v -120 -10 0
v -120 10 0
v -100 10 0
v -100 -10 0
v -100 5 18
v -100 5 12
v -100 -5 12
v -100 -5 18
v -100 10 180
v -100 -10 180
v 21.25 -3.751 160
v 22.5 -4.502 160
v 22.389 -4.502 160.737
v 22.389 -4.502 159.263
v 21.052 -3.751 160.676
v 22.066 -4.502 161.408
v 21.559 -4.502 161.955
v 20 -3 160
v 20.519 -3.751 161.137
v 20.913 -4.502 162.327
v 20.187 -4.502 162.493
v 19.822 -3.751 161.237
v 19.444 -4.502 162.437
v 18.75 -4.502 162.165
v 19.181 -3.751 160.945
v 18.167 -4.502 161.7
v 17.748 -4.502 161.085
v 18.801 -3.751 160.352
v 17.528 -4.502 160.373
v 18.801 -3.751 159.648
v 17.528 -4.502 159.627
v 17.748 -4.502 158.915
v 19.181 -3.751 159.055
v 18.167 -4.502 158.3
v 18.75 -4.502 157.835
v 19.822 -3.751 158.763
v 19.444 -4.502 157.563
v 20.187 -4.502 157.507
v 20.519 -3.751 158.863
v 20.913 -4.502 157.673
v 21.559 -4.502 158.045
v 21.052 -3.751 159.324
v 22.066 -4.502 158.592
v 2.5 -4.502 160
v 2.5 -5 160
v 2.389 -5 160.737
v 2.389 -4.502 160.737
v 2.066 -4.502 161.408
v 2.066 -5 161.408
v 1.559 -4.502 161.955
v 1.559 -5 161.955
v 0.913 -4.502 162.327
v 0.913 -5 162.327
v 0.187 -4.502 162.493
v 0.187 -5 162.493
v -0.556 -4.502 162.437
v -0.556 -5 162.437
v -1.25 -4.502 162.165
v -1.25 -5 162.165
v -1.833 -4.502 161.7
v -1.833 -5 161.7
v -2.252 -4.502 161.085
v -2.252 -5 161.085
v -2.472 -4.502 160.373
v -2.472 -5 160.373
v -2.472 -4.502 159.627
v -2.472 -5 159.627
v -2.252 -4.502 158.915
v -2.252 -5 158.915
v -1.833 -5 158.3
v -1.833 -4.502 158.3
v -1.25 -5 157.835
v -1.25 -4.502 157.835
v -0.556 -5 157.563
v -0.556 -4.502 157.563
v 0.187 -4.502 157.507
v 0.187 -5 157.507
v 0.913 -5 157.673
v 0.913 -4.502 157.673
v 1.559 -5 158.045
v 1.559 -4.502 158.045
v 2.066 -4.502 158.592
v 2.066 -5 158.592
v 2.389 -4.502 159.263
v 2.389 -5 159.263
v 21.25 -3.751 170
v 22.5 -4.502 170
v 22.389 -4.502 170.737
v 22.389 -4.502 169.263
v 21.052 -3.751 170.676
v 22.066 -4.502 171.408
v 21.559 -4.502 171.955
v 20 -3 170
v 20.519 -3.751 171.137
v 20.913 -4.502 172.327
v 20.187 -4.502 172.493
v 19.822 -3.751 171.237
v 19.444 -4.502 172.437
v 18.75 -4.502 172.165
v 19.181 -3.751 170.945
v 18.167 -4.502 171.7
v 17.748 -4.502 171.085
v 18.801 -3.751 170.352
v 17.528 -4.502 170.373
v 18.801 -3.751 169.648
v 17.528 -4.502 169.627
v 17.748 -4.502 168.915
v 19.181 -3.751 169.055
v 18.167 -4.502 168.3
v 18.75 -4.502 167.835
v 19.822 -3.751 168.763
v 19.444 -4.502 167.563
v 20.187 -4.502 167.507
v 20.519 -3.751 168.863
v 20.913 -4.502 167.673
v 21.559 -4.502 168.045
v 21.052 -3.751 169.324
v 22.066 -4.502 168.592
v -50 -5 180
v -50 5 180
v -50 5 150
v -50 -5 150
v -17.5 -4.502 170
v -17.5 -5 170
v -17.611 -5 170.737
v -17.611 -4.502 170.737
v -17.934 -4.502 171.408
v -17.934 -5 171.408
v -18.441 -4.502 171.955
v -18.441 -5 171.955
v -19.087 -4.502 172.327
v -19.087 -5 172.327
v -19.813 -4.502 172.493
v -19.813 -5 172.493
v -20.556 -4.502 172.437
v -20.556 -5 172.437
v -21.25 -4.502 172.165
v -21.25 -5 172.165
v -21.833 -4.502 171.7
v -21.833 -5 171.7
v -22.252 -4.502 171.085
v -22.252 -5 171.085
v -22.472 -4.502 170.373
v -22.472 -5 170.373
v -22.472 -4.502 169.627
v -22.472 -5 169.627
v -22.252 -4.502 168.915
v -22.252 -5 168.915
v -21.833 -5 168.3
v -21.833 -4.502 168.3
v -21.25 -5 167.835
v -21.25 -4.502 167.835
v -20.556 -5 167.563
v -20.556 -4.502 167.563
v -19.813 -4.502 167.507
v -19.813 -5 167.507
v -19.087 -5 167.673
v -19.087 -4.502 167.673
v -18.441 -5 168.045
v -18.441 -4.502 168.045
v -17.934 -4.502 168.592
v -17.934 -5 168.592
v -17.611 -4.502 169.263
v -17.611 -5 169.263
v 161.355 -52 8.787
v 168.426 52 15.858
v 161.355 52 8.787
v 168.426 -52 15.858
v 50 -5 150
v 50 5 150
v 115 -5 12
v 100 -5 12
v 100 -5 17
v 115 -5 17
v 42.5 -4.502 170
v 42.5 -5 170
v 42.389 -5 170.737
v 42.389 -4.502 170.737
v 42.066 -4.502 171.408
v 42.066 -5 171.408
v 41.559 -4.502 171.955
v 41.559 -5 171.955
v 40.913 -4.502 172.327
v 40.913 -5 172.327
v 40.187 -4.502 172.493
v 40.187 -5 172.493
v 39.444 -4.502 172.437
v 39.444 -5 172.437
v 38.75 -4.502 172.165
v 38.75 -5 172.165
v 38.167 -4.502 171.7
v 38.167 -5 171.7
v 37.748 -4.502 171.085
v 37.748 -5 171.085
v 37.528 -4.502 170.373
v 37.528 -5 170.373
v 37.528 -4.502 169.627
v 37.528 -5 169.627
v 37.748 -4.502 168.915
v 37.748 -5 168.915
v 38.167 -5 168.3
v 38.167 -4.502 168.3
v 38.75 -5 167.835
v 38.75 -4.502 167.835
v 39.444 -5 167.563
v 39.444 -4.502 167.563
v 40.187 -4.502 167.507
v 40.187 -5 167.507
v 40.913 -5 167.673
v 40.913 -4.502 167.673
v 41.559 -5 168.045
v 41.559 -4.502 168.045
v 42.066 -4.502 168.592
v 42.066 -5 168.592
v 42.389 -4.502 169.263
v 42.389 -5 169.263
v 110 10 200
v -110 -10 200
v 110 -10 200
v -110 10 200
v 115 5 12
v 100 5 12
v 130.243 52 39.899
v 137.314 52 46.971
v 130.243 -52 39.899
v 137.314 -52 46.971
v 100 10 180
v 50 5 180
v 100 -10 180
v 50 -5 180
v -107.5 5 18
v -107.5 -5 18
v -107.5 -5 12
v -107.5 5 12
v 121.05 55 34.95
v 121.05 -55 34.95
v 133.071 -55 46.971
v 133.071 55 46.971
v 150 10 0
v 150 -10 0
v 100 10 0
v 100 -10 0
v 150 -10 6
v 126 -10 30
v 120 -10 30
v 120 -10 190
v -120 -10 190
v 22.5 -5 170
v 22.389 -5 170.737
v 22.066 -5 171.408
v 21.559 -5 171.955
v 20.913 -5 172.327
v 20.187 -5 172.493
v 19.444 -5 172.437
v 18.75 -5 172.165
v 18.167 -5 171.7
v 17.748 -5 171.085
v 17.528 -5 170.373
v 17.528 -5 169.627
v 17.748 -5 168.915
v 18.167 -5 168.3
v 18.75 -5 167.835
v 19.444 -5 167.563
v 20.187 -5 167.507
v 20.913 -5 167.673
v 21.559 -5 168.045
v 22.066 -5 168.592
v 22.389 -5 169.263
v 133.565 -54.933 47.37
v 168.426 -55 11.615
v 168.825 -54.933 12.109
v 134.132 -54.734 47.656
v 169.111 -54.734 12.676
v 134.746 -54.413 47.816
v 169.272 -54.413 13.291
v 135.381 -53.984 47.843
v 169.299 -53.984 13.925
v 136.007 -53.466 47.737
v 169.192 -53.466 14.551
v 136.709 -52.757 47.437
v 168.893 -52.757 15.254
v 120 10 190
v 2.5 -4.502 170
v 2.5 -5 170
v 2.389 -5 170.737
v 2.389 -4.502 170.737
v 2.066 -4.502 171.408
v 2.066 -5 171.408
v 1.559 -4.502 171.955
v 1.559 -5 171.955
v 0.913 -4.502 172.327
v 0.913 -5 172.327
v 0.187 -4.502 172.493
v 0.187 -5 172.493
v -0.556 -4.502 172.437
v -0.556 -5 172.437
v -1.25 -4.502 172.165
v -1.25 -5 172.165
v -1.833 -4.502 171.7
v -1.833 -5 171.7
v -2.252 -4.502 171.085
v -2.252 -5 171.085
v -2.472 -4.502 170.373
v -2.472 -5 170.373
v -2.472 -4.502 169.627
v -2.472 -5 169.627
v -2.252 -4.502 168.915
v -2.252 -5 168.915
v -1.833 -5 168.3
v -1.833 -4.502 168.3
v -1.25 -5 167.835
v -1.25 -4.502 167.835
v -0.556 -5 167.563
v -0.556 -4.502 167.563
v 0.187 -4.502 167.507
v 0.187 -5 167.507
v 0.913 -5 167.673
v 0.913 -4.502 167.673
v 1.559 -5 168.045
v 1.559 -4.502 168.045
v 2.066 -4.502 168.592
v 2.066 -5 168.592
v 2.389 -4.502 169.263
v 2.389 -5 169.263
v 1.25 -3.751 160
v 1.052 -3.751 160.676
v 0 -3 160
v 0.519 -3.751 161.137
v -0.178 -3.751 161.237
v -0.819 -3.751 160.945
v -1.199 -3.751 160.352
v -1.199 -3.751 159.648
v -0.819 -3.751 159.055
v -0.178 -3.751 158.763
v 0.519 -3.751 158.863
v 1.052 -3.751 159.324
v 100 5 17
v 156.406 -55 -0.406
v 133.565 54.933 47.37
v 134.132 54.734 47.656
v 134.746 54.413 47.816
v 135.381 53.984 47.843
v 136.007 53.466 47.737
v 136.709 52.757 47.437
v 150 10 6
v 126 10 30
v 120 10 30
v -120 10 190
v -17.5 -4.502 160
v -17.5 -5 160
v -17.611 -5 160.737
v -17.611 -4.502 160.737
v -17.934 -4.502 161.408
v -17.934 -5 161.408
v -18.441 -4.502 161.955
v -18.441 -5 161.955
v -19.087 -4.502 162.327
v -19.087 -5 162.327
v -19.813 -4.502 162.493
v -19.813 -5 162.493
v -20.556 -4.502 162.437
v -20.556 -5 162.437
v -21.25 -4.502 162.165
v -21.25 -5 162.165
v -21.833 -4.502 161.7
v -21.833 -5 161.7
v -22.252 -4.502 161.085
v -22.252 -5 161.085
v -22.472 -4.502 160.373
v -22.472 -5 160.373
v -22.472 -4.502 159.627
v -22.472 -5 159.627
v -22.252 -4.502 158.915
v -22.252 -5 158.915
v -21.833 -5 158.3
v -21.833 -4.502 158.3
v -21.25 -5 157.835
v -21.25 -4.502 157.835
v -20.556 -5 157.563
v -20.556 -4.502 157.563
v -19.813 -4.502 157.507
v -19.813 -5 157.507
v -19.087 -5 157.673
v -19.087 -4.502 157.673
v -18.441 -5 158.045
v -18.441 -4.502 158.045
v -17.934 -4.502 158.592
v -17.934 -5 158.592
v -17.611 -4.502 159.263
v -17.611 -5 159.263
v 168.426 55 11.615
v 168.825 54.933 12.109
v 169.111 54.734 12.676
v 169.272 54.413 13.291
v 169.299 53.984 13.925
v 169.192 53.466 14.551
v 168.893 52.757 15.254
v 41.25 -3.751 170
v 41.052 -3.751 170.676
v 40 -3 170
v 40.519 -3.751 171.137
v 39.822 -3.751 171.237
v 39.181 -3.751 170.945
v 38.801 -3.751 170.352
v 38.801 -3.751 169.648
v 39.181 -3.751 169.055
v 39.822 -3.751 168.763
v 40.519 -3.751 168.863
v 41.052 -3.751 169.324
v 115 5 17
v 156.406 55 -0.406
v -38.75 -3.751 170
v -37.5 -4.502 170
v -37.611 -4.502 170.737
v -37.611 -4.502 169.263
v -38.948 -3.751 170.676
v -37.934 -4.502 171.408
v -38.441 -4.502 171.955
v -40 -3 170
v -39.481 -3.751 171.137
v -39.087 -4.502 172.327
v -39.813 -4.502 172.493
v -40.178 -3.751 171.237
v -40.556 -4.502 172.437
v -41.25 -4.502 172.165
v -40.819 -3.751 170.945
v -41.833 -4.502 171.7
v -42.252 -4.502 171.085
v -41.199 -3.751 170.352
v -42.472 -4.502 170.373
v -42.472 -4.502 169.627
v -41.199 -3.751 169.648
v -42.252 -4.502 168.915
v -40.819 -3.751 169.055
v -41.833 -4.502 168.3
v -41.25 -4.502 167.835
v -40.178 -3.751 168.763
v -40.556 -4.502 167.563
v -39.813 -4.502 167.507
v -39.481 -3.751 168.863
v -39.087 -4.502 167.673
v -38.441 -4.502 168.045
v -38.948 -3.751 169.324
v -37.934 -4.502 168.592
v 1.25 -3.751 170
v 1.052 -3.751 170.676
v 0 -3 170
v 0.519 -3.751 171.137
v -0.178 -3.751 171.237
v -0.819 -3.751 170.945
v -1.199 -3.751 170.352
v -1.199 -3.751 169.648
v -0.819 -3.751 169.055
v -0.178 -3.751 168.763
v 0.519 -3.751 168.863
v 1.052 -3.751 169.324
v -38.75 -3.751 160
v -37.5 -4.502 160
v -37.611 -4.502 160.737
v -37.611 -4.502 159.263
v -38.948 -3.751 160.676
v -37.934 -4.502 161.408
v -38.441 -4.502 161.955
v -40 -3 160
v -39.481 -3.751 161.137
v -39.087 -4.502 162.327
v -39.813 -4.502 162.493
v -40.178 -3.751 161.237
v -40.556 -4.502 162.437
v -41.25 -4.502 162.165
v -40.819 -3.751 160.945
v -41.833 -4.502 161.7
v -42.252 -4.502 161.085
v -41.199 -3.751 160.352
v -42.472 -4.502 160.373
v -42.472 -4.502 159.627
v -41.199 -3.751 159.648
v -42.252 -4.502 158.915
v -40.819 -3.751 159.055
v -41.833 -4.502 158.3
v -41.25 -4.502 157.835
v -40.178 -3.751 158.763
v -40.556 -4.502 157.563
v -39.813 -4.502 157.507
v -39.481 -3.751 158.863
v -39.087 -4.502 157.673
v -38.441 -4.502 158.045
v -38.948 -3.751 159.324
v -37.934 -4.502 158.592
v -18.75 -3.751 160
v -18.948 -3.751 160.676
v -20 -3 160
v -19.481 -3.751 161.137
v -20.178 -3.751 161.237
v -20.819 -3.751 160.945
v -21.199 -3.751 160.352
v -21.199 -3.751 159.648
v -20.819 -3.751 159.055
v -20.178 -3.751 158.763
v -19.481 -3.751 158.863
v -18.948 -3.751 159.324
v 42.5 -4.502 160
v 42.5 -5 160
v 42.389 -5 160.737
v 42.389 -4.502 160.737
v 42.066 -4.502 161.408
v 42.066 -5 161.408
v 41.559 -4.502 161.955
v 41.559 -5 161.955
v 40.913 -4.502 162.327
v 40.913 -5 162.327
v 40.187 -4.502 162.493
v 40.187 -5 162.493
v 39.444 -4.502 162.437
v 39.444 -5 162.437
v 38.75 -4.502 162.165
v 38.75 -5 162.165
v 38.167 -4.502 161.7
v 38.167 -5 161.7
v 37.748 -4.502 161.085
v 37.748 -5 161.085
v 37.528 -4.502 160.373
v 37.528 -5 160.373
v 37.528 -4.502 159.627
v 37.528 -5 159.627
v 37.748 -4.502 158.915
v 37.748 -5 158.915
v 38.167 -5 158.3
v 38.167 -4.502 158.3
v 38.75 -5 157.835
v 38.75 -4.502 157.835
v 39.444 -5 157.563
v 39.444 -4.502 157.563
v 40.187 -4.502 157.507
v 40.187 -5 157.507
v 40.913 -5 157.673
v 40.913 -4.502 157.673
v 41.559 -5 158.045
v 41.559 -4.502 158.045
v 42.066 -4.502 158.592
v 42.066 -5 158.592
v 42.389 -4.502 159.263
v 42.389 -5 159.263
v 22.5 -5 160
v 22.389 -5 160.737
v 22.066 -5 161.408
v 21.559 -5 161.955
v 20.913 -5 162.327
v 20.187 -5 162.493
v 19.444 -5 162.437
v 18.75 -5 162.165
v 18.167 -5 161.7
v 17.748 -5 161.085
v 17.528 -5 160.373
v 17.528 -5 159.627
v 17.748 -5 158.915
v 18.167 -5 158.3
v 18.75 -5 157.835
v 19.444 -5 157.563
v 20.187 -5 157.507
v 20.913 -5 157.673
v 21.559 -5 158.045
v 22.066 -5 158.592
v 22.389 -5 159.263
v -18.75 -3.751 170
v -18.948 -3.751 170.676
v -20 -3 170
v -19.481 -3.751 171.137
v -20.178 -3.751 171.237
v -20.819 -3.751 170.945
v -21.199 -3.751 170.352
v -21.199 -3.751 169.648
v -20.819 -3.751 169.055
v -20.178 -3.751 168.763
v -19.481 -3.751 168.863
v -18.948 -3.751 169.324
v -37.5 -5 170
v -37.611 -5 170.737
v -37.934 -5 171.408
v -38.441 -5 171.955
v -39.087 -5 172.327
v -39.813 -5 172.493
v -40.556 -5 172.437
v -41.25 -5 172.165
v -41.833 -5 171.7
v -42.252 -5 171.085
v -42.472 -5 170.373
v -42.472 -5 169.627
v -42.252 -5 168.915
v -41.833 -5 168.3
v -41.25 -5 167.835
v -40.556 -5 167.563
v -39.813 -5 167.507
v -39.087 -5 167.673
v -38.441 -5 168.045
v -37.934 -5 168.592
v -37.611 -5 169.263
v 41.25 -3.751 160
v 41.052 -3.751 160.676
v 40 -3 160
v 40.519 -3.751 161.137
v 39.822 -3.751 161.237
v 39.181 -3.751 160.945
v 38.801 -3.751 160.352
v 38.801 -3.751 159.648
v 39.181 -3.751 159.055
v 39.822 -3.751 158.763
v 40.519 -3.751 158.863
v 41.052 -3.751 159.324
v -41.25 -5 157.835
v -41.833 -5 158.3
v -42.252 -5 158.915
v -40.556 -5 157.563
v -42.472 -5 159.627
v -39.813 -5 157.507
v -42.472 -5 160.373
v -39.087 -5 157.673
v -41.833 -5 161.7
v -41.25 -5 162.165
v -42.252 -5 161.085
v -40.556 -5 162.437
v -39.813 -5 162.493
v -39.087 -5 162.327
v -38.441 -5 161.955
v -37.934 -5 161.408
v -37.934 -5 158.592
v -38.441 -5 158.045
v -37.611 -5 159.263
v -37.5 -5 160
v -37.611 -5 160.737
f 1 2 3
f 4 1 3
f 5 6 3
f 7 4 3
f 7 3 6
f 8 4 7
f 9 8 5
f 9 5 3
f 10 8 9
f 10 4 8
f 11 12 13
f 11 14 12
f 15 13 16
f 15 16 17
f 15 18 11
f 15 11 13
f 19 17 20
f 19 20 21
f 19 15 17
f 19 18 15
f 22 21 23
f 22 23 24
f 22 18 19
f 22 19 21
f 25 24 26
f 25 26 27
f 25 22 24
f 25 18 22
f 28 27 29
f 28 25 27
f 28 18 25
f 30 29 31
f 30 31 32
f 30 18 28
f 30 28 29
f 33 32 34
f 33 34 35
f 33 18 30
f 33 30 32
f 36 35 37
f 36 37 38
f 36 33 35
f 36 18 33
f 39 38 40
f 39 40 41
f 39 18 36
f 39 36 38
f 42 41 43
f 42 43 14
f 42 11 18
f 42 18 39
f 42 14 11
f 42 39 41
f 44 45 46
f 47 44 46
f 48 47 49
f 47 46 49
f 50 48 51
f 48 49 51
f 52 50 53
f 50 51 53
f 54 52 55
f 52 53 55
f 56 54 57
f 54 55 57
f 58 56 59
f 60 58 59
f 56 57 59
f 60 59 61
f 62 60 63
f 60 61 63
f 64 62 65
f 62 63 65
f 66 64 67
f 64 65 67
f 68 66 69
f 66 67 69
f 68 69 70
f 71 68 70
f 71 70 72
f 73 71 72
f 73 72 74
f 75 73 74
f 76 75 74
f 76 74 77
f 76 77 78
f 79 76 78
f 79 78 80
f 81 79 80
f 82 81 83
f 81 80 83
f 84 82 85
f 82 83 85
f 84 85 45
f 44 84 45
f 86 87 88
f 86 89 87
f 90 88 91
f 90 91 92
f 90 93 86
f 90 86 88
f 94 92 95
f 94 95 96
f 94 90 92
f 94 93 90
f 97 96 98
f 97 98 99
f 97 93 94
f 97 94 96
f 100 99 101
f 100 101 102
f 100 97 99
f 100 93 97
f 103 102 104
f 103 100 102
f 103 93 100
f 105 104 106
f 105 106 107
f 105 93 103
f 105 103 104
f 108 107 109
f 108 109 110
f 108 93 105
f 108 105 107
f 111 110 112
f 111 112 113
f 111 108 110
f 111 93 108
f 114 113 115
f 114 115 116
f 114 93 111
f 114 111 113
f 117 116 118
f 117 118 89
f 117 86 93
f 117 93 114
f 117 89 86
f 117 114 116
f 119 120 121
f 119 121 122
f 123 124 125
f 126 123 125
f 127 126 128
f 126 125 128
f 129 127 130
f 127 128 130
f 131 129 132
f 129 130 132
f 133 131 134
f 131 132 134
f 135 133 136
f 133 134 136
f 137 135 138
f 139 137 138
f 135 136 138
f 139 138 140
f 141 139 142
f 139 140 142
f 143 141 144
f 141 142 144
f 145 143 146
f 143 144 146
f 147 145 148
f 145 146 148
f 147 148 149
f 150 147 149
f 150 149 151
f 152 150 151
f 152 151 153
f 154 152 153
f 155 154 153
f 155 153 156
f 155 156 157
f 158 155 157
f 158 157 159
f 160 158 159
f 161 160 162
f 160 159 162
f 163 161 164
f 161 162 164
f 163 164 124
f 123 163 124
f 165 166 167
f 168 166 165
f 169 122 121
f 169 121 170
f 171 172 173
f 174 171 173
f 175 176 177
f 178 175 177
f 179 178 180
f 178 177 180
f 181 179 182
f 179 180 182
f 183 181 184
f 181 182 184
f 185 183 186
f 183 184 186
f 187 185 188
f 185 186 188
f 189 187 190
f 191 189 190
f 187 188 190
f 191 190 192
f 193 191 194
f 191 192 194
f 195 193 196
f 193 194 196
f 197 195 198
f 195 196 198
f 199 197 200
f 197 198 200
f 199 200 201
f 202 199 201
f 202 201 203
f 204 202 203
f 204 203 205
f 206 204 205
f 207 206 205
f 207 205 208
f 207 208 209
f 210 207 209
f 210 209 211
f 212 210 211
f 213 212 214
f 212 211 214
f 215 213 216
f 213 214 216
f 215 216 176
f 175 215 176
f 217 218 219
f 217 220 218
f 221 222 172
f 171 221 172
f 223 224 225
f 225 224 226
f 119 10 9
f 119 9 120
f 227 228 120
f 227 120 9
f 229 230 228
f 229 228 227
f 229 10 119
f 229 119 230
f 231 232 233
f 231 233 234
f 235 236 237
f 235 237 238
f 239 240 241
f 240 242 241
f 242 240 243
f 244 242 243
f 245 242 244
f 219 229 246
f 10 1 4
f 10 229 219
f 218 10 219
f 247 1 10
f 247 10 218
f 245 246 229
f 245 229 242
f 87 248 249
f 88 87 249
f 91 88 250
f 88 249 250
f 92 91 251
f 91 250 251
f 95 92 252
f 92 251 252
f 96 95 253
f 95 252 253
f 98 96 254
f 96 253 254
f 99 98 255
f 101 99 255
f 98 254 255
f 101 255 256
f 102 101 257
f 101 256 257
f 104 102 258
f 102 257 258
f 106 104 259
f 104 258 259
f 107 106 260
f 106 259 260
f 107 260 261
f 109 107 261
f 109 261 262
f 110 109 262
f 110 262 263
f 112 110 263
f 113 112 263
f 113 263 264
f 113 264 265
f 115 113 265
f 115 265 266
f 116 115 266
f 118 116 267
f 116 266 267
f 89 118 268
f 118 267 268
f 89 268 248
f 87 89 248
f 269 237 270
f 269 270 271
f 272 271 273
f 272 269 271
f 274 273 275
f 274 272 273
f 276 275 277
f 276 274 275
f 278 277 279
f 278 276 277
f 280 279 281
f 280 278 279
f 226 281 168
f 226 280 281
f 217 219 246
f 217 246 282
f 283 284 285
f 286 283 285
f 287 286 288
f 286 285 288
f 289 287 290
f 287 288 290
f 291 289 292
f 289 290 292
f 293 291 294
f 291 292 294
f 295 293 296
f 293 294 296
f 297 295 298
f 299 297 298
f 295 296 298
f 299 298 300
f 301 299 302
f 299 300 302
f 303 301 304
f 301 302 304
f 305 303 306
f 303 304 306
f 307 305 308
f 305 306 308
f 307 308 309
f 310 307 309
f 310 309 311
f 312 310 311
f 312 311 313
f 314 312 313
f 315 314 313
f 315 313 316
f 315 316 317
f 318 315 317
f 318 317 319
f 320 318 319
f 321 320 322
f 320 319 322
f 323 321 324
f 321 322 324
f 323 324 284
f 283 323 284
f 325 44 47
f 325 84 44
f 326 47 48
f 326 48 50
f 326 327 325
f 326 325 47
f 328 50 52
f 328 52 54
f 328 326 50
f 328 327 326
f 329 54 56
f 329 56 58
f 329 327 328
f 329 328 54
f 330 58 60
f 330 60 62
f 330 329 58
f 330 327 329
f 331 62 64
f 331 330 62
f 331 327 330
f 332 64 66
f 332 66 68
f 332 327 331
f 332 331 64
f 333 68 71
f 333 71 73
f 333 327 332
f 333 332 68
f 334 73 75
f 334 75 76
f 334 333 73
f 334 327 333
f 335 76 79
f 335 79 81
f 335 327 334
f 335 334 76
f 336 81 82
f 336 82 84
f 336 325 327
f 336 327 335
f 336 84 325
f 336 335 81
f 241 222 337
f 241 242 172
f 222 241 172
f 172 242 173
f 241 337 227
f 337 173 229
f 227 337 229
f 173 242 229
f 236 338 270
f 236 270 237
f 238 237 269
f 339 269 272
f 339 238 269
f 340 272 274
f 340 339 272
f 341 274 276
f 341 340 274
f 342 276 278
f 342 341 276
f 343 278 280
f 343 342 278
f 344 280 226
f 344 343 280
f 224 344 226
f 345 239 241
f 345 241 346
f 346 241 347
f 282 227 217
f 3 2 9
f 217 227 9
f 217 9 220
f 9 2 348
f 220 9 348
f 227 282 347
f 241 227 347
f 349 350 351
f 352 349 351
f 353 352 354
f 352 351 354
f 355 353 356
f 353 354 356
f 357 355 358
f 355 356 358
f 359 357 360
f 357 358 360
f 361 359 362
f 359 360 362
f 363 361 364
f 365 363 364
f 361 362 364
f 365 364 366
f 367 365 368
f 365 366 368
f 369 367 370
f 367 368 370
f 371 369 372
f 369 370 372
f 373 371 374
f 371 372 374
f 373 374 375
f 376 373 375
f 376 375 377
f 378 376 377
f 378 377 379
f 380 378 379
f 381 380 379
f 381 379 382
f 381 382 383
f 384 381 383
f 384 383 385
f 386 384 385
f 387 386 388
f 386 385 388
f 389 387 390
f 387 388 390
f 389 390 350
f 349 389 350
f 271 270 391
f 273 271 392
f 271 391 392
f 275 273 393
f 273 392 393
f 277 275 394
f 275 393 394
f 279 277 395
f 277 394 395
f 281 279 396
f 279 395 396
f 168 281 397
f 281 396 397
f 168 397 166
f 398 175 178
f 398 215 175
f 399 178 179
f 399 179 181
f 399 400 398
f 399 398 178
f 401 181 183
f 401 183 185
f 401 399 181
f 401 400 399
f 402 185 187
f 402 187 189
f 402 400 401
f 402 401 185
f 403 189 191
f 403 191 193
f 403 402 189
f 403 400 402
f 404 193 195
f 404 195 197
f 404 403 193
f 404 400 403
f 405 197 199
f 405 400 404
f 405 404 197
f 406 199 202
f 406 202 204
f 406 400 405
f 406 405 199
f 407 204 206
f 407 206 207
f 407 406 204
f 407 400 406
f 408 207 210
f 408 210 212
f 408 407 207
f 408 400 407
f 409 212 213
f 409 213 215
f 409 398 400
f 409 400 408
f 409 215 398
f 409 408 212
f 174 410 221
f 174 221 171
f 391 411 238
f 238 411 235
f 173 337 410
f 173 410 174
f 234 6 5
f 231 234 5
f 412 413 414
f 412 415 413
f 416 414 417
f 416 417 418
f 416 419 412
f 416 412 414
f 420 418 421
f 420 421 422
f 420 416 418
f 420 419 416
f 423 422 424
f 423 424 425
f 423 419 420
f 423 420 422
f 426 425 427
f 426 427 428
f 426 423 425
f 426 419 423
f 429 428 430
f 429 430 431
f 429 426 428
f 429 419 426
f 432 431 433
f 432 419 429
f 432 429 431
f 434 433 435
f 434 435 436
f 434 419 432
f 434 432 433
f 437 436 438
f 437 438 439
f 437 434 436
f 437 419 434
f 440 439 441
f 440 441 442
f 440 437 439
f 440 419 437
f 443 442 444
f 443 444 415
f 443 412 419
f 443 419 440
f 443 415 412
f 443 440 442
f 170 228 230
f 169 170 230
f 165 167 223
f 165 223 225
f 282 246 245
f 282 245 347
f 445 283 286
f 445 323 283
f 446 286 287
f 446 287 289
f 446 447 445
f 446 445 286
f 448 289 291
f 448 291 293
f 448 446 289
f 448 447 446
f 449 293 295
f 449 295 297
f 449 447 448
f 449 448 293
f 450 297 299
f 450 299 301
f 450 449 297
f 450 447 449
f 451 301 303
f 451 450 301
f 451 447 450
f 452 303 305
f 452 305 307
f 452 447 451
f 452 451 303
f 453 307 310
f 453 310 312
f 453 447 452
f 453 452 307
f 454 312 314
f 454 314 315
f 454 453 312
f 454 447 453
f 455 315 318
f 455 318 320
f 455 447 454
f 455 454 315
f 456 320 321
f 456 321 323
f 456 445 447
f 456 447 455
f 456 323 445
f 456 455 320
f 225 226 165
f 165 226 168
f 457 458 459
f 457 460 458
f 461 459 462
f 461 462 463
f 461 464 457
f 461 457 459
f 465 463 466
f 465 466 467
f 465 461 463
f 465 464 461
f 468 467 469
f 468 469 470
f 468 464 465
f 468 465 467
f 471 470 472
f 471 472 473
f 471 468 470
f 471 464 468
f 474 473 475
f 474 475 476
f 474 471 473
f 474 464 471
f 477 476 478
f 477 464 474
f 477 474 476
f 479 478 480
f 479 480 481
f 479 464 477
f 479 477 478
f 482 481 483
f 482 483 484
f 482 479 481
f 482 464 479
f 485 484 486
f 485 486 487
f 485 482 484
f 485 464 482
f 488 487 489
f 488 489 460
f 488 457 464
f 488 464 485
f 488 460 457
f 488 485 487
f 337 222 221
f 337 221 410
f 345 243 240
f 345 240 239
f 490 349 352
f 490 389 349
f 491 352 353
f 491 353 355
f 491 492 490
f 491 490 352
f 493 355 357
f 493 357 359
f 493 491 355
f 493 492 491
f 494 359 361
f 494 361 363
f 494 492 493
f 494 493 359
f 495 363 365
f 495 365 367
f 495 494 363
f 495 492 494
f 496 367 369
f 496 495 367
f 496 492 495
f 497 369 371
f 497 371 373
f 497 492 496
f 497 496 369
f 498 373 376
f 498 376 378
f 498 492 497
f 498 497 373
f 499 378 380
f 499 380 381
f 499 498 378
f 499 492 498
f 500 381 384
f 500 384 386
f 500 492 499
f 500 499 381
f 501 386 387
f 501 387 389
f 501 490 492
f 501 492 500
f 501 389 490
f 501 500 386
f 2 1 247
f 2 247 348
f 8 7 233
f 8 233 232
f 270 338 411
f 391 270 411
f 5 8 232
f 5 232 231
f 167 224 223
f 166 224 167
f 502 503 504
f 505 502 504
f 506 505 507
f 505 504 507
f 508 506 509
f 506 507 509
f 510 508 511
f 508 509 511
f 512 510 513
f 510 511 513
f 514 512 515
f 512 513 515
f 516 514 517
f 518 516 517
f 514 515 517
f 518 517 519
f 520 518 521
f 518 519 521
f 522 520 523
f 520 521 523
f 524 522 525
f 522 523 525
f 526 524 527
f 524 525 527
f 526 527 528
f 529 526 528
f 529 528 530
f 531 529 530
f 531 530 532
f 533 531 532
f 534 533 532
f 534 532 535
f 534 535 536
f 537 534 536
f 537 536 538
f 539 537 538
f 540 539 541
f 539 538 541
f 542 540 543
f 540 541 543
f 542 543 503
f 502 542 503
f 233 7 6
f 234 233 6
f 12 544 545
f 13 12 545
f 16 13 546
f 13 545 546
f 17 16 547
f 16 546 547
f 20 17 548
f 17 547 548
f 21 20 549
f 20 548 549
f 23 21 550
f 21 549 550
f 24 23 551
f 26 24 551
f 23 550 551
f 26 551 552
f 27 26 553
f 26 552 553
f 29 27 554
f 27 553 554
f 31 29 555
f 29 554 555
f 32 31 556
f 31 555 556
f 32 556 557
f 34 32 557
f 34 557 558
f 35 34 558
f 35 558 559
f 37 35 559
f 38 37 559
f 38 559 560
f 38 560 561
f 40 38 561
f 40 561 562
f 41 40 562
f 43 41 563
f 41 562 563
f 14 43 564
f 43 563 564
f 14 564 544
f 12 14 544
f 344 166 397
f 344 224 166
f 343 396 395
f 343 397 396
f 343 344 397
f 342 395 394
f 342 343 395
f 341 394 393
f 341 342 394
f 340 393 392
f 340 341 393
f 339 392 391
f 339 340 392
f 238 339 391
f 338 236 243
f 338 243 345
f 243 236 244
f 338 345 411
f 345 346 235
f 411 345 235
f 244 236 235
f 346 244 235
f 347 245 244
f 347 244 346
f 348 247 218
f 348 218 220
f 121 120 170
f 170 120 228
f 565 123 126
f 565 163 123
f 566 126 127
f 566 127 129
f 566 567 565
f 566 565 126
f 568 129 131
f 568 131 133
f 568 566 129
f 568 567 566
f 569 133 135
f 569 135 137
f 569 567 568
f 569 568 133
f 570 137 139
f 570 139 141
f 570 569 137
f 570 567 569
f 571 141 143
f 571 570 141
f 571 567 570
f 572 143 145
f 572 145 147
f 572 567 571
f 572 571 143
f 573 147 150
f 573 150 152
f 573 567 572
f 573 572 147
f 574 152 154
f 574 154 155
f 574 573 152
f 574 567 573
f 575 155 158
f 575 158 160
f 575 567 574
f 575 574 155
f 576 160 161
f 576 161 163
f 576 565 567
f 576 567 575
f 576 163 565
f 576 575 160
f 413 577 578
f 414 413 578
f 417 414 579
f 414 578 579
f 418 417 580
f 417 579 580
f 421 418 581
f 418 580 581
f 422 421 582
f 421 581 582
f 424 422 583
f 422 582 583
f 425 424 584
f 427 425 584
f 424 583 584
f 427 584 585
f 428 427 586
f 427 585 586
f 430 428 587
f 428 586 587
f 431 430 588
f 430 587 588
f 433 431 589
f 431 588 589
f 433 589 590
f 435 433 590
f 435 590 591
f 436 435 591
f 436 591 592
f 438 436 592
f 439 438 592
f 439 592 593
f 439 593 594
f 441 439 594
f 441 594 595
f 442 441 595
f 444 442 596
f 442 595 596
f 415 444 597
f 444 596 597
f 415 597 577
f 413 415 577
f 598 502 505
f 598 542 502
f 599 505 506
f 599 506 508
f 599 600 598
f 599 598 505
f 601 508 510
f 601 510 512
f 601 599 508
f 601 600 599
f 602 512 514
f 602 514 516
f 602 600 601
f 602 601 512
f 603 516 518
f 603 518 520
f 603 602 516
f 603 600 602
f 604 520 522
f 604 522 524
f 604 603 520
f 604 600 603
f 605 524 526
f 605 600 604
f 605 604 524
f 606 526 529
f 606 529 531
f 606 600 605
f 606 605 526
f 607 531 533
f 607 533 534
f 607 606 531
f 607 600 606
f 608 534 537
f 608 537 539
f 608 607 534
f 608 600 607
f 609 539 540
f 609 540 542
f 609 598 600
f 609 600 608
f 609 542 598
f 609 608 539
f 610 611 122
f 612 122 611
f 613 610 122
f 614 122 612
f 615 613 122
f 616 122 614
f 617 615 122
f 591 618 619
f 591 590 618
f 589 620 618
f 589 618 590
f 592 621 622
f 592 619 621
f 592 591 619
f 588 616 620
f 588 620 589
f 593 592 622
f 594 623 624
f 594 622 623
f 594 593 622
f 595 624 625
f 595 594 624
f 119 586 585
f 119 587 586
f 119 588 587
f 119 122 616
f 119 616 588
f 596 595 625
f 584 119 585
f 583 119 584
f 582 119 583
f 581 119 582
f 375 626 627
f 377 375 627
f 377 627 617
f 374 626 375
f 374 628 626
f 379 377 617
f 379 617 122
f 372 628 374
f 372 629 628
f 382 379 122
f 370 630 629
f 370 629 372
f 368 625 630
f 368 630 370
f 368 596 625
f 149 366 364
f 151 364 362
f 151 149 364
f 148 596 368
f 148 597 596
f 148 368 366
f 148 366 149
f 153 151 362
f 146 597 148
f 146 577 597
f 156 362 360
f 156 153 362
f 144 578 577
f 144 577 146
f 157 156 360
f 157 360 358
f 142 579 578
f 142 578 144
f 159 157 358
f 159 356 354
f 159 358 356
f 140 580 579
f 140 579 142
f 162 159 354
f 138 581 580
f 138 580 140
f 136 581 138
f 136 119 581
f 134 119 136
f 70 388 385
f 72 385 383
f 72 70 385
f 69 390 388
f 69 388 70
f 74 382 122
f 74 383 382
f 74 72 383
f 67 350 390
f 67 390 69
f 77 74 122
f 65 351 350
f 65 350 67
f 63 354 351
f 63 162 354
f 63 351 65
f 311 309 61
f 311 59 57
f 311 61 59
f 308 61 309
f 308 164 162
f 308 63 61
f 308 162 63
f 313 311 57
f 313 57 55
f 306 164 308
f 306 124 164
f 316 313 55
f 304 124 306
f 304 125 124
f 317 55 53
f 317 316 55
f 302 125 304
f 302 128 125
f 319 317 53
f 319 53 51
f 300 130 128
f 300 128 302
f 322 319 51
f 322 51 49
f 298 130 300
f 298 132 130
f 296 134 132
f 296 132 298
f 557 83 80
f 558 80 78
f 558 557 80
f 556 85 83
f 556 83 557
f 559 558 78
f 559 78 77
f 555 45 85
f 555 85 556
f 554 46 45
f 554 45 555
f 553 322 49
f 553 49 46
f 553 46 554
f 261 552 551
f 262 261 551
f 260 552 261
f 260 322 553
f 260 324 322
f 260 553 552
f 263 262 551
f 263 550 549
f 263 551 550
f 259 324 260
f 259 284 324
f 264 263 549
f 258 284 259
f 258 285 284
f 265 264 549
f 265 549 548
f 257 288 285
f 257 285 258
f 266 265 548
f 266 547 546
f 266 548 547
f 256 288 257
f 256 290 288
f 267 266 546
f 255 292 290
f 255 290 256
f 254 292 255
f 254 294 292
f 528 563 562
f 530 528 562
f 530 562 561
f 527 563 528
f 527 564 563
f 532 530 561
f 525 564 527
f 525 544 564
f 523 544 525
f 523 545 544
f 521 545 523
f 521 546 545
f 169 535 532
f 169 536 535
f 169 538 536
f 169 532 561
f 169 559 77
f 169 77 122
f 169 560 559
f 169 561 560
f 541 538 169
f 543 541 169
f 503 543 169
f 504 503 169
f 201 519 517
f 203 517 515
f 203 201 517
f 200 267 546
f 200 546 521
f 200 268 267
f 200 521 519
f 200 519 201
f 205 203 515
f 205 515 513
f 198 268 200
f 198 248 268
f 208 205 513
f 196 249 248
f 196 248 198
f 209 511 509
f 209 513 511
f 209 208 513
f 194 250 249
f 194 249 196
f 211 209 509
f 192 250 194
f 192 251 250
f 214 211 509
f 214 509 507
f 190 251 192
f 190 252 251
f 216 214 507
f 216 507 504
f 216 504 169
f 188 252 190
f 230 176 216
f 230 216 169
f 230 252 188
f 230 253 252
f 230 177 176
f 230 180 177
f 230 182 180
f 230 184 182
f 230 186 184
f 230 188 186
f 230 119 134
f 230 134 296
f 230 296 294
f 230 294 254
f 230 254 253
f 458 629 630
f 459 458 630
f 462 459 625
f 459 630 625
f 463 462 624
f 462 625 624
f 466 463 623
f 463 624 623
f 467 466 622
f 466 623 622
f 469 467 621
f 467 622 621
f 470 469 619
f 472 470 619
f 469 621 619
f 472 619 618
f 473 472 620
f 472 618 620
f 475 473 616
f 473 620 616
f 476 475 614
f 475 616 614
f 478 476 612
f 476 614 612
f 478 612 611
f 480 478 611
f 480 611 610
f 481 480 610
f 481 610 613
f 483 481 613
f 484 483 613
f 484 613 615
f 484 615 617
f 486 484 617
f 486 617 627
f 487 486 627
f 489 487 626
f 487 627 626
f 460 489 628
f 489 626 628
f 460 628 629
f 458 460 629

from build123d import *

# Parameters (mm, degrees)
SKETCH_W        = 240
SKETCH_H        = 20
PAD_DEPTH       = 200
SKETCH001_W     = 200
SKETCH001_H     = 180
POCKET_DEPTH    = 20.001
SKETCH002_W     = 100
SKETCH002_H     = 10
PAD001_DEPTH    = 30
SKETCH003_R     = 2.5
HOLE_DEPTH      = 0.497848
HOLE_TIPS_R     = 2.5
SKETCH004_W     = 10
SKETCH004_H     = 6
POCKET001_DEPTH = 7.5
SKETCH005_W     = 10
SKETCH005_H     = 5
POCKET002_DEPTH = 15
SKETCH006_W     = 20
SKETCH006_H     = 30
PAD002_DEPTH    = 30
CHAMFER_SIZE    = 24
SKETCH007_W     = 110
SKETCH007_H     = 50
PAD003_DEPTH    = 20
FILLET_R        = 3
FILLET_FACE8_W  = 104
FILLET_FACE8_H  = 44
POCKET003_DEPTH = 10
CHAMFER001_SIZE = 10


with BuildPart() as part:
    # Sketch → Pad (new body)
    with BuildSketch(Plane.XY):
        Rectangle(SKETCH_W, SKETCH_H)
    extrude(amount=PAD_DEPTH)

    # Sketch001 (on Face3 of Pad) → Pocket (cut, through all)
    with BuildSketch(Plane.XZ.offset(10)):
        with Locations((0, 90)):
            Rectangle(SKETCH001_W, SKETCH001_H)
    extrude(amount=-POCKET_DEPTH, mode=Mode.SUBTRACT)

    # Sketch002 (on Face4 of Pocket) → Pad001 (join)
    with BuildSketch(Plane(origin=(0, 0, 180), x_dir=(1, 0, 0), z_dir=(0, 0, -1))):
        Rectangle(SKETCH002_W, SKETCH002_H)
    extrude(amount=PAD001_DEPTH)

    # Sketch003 (on Face14 of Pad001) → Hole (cut)
    with BuildSketch(Plane.XZ.offset(5)):
        with Locations((-40, 170)):
            Circle(SKETCH003_R)
        with Locations((-20, 170)):
            Circle(SKETCH003_R)
        with Locations((0, 170)):
            Circle(SKETCH003_R)
        with Locations((20, 170)):
            Circle(SKETCH003_R)
        with Locations((40, 170)):
            Circle(SKETCH003_R)
        with Locations((-40, 160)):
            Circle(SKETCH003_R)
        with Locations((-20, 160)):
            Circle(SKETCH003_R)
        with Locations((0, 160)):
            Circle(SKETCH003_R)
        with Locations((20, 160)):
            Circle(SKETCH003_R)
        with Locations((40, 160)):
            Circle(SKETCH003_R)
    extrude(amount=-HOLE_DEPTH, mode=Mode.SUBTRACT)

    # Hole tips → Hole tip 1 section 0
    with BuildSketch(Plane.XZ.offset(4.502152), mode=Mode.PRIVATE) as hole_tip_1_s0:
        with Locations((-40, 170)):
            Circle(HOLE_TIPS_R)
    loft([hole_tip_1_s0.sketch, Vertex(-40, -3, 170)], mode=Mode.SUBTRACT)

    # Hole tips → Hole tip 2 section 0
    with BuildSketch(Plane.XZ.offset(4.502152), mode=Mode.PRIVATE) as hole_tip_2_s0:
        with Locations((-20, 170)):
            Circle(HOLE_TIPS_R)
    loft([hole_tip_2_s0.sketch, Vertex(-20, -3, 170)], mode=Mode.SUBTRACT)

    # Hole tips → Hole tip 3 section 0
    with BuildSketch(Plane.XZ.offset(4.502152), mode=Mode.PRIVATE) as hole_tip_3_s0:
        with Locations((0, 170)):
            Circle(HOLE_TIPS_R)
    loft([hole_tip_3_s0.sketch, Vertex(0, -3, 170)], mode=Mode.SUBTRACT)

    # Hole tips → Hole tip 4 section 0
    with BuildSketch(Plane.XZ.offset(4.502152), mode=Mode.PRIVATE) as hole_tip_4_s0:
        with Locations((20, 170)):
            Circle(HOLE_TIPS_R)
    loft([hole_tip_4_s0.sketch, Vertex(20, -3, 170)], mode=Mode.SUBTRACT)

    # Hole tips → Hole tip 5 section 0
    with BuildSketch(Plane.XZ.offset(4.502152), mode=Mode.PRIVATE) as hole_tip_5_s0:
        with Locations((40, 170)):
            Circle(HOLE_TIPS_R)
    loft([hole_tip_5_s0.sketch, Vertex(40, -3, 170)], mode=Mode.SUBTRACT)

    # Hole tips → Hole tip 6 section 0
    with BuildSketch(Plane.XZ.offset(4.502152), mode=Mode.PRIVATE) as hole_tip_6_s0:
        with Locations((-40, 160)):
            Circle(HOLE_TIPS_R)
    loft([hole_tip_6_s0.sketch, Vertex(-40, -3, 160)], mode=Mode.SUBTRACT)

    # Hole tips → Hole tip 7 section 0
    with BuildSketch(Plane.XZ.offset(4.502152), mode=Mode.PRIVATE) as hole_tip_7_s0:
        with Locations((-20, 160)):
            Circle(HOLE_TIPS_R)
    loft([hole_tip_7_s0.sketch, Vertex(-20, -3, 160)], mode=Mode.SUBTRACT)

    # Hole tips → Hole tip 8 section 0
    with BuildSketch(Plane.XZ.offset(4.502152), mode=Mode.PRIVATE) as hole_tip_8_s0:
        with Locations((0, 160)):
            Circle(HOLE_TIPS_R)
    loft([hole_tip_8_s0.sketch, Vertex(0, -3, 160)], mode=Mode.SUBTRACT)

    # Hole tips → Hole tip 9 section 0
    with BuildSketch(Plane.XZ.offset(4.502152), mode=Mode.PRIVATE) as hole_tip_9_s0:
        with Locations((20, 160)):
            Circle(HOLE_TIPS_R)
    loft([hole_tip_9_s0.sketch, Vertex(20, -3, 160)], mode=Mode.SUBTRACT)

    # Hole tips → Hole tip 10 section 0
    with BuildSketch(Plane.XZ.offset(4.502152), mode=Mode.PRIVATE) as hole_tip_10_s0:
        with Locations((40, 160)):
            Circle(HOLE_TIPS_R)
    loft([hole_tip_10_s0.sketch, Vertex(40, -3, 160)], mode=Mode.SUBTRACT)

    # Sketch004 (on Face3 of Hole) → Pocket001 (cut, symmetric)
    with BuildSketch(Plane.YZ.offset(-100)):
        with Locations((0, 15)):
            Rectangle(SKETCH004_W, SKETCH004_H)
    extrude(amount=POCKET001_DEPTH, both=True, mode=Mode.SUBTRACT)

    # Sketch005 (on Face5 of Pocket001) → Pocket002 (cut)
    with BuildSketch(Plane(origin=(100, 0, 0), x_dir=(0, -1, 0), z_dir=(-1, 0, 0))):
        with Locations((0, 14.5)):
            Rectangle(SKETCH005_W, SKETCH005_H)
    extrude(amount=-POCKET002_DEPTH, mode=Mode.SUBTRACT)

    # Sketch006 (on Face7 of Pocket002) → Pad002 (join)
    with BuildSketch(Plane.YZ.offset(120)):
        with Locations((0, 15)):
            Rectangle(SKETCH006_W, SKETCH006_H)
    extrude(amount=PAD002_DEPTH)

    # Chamfer
    chamfer_edges = [part.edges().sort_by_distance(p)[0] for p in [
        (150, 0, 30),
    ]]
    chamfer(chamfer_edges, length=CHAMFER_SIZE)

    # Sketch007 (on Face3 of Chamfer) → Pad003 (join)
    with BuildSketch(Plane(origin=(78, 0, 78), x_dir=(0, 1, 0), z_dir=(0.707107, 0, 0.707107))):
        with Locations((0, -85.882251)):
            Rectangle(SKETCH007_W, SKETCH007_H)
    extrude(amount=PAD003_DEPTH)

    # Fillet
    fillet_edges = [part.edges().sort_by_distance(p)[0] for p in [
        (152.870058, -55, 31.414214),
        (170.547727, 0, 13.736544),
        (135.192388, 0, 49.091883),
        (152.870058, 55, 31.414214),
    ]]
    fillet(fillet_edges, radius=FILLET_R)

    # Fillet Face8 → Pocket003 (cut)
    with BuildSketch(Plane(origin=(152.870058, 0, 31.414214), x_dir=(0, -1, 0), z_dir=(0.707107, 0, 0.707107))):
        Rectangle(FILLET_FACE8_W, FILLET_FACE8_H)
    extrude(amount=-POCKET003_DEPTH, mode=Mode.SUBTRACT)

    # Chamfer001
    chamfer001_edges = [part.edges().sort_by_distance(p)[0] for p in [
        (120, 0, 200),
        (-120, 0, 200),
    ]]
    chamfer(chamfer001_edges, length=CHAMFER001_SIZE)


solid = part.part
